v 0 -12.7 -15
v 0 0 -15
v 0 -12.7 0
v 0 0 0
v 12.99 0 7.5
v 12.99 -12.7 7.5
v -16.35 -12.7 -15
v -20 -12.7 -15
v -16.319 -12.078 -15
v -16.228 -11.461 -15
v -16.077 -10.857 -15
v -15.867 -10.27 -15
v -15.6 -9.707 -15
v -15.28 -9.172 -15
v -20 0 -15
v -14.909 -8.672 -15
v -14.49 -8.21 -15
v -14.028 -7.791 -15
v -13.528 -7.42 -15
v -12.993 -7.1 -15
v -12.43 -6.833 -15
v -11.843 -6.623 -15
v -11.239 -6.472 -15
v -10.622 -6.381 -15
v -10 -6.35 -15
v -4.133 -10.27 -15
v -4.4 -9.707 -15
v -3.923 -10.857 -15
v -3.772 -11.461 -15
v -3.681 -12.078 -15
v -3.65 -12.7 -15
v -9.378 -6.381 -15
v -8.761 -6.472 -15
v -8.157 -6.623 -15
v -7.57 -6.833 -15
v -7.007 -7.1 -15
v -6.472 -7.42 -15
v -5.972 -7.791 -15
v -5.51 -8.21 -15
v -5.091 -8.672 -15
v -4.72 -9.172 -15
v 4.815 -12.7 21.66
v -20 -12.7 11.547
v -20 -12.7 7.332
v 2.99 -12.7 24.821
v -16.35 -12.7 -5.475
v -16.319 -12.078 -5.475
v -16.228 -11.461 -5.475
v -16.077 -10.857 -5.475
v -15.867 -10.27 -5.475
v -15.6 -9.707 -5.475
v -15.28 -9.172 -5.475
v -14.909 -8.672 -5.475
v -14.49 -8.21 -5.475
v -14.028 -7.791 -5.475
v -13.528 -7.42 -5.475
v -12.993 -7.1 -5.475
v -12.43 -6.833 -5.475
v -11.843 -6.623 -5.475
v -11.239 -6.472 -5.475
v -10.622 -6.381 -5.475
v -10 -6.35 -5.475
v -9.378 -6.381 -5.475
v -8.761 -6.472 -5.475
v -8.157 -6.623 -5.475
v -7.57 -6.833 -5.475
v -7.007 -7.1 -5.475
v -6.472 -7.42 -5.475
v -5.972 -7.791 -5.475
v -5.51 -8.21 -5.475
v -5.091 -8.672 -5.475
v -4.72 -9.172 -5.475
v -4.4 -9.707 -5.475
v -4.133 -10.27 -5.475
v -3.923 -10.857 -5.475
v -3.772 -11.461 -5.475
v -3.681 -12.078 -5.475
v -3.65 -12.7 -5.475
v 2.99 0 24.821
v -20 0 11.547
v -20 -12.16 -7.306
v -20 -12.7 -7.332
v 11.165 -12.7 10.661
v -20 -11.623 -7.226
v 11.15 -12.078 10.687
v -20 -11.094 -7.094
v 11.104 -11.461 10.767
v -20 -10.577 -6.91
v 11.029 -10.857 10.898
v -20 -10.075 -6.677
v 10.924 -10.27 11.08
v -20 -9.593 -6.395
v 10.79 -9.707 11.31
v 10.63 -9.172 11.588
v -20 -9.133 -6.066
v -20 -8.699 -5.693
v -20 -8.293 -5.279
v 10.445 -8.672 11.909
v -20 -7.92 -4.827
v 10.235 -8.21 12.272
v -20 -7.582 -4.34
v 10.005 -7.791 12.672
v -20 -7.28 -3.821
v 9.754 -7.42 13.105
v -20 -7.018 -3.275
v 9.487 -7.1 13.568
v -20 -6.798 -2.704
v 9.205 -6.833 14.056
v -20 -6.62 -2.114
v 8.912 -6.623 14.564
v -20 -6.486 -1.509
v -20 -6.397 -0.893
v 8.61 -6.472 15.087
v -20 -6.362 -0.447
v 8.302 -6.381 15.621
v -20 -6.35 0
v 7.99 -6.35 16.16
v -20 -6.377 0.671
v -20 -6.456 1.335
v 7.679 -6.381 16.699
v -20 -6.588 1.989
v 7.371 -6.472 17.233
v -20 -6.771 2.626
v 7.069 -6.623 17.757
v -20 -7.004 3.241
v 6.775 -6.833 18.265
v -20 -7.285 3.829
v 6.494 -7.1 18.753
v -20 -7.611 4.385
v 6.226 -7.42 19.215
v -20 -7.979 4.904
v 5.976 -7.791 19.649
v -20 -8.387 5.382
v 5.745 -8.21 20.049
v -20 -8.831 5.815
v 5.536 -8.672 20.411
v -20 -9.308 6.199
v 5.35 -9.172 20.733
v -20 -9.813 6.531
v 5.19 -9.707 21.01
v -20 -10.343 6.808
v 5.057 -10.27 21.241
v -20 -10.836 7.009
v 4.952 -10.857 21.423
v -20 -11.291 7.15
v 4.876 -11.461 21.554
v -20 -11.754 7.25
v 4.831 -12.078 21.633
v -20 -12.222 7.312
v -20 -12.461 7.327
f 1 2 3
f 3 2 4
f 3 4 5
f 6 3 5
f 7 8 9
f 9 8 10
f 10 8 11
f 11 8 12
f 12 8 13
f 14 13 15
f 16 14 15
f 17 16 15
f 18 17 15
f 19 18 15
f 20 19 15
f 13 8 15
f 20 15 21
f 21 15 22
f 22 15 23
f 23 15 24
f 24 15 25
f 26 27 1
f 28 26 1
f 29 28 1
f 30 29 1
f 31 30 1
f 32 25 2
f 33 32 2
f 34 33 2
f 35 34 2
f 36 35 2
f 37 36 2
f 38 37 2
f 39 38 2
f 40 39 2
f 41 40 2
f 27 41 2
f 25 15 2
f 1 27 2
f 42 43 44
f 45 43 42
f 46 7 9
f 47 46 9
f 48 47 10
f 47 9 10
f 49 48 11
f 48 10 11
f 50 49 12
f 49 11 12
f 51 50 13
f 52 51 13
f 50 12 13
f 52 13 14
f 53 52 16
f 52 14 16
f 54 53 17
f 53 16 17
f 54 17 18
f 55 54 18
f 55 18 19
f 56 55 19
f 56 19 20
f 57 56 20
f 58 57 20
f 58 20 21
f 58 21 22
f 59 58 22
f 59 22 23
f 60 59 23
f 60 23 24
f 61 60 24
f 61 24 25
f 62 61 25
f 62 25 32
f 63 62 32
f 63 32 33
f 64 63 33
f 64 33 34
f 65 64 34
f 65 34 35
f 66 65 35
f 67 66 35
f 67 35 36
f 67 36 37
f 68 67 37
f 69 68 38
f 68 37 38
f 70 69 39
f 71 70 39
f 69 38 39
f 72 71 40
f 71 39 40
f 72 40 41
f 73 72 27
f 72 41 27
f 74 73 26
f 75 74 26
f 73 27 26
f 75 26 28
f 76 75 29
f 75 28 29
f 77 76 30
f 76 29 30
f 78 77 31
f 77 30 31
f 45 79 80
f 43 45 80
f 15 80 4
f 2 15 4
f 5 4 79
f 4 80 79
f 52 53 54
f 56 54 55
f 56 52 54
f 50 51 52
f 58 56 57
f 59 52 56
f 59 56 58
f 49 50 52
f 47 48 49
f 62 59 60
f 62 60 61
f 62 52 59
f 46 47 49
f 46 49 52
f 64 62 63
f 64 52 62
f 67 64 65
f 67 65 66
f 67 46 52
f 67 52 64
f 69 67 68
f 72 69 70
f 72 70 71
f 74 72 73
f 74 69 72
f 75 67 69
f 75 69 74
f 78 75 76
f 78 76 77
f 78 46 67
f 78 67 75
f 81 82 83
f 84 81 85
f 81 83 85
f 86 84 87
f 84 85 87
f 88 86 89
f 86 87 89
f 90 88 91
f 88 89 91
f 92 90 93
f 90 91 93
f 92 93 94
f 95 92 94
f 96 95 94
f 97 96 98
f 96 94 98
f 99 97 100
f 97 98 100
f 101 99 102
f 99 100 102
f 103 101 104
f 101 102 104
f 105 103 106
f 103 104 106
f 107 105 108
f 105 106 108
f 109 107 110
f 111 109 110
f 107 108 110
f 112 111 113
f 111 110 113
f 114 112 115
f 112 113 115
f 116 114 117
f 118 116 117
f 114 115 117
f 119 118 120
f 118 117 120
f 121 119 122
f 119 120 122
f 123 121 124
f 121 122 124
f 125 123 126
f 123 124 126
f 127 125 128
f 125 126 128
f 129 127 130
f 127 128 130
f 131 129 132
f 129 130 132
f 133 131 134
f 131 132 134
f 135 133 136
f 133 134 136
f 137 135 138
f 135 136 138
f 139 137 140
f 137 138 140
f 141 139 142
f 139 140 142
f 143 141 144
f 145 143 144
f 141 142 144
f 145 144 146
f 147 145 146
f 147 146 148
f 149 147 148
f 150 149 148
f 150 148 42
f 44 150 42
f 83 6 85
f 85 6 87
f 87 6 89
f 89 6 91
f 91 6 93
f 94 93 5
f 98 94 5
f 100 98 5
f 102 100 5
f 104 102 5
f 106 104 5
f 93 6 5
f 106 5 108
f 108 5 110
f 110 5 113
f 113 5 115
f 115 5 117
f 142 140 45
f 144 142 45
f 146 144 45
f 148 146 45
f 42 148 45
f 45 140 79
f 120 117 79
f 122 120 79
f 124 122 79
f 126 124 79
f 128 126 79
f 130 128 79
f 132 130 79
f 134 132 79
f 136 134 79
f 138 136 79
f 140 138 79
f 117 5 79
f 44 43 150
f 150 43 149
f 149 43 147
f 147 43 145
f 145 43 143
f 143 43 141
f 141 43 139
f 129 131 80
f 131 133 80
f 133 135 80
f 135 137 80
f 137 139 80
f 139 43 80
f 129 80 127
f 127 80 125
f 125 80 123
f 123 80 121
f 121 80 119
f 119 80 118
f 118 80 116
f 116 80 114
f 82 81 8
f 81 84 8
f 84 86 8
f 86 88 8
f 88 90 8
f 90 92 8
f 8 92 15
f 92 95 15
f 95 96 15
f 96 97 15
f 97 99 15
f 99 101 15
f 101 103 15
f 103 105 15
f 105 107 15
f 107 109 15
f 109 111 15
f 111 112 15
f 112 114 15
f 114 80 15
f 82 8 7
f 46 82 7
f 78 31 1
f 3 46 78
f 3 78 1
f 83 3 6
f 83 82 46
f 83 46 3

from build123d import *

# Parameters (mm, degrees)
F1_DEPTH = 12.7
F2_R     = 6.35
F3_DEPTH = 39.8215080757
F4_R     = 6.35
F5_DEPTH = 9.525


with BuildPart() as f1:
    # F0 (on Front) → F1 (new body)
    with BuildSketch(Plane.XZ):
        Polygon((-20, 11.5470053838), (-20, -15), (0, -15), (0, 0), (12.9903810568, 7.5), (2.9903810568, 24.8205080757), align=None)
    extrude(amount=F1_DEPTH)

    # F2 (on face) → F3 (cut, through all)
    with BuildSketch(Plane(origin=(12.9903810568, 0, 7.5), x_dir=(0, 1, 0), z_dir=(0.8660254038, 0, 0.5))):
        with Locations((-12.7, 10)):
            Circle(F2_R)
    extrude(amount=-F3_DEPTH, mode=Mode.SUBTRACT)

    # F4 (on face) → F5 (cut)
    with BuildSketch(Plane(origin=(0, 0, -15), x_dir=(1, 0, 0), z_dir=(0, 0, -1))):
        with Locations((-10, 12.7)):
            Circle(F4_R)
    extrude(amount=-F5_DEPTH, mode=Mode.SUBTRACT)


solid = f1.part
